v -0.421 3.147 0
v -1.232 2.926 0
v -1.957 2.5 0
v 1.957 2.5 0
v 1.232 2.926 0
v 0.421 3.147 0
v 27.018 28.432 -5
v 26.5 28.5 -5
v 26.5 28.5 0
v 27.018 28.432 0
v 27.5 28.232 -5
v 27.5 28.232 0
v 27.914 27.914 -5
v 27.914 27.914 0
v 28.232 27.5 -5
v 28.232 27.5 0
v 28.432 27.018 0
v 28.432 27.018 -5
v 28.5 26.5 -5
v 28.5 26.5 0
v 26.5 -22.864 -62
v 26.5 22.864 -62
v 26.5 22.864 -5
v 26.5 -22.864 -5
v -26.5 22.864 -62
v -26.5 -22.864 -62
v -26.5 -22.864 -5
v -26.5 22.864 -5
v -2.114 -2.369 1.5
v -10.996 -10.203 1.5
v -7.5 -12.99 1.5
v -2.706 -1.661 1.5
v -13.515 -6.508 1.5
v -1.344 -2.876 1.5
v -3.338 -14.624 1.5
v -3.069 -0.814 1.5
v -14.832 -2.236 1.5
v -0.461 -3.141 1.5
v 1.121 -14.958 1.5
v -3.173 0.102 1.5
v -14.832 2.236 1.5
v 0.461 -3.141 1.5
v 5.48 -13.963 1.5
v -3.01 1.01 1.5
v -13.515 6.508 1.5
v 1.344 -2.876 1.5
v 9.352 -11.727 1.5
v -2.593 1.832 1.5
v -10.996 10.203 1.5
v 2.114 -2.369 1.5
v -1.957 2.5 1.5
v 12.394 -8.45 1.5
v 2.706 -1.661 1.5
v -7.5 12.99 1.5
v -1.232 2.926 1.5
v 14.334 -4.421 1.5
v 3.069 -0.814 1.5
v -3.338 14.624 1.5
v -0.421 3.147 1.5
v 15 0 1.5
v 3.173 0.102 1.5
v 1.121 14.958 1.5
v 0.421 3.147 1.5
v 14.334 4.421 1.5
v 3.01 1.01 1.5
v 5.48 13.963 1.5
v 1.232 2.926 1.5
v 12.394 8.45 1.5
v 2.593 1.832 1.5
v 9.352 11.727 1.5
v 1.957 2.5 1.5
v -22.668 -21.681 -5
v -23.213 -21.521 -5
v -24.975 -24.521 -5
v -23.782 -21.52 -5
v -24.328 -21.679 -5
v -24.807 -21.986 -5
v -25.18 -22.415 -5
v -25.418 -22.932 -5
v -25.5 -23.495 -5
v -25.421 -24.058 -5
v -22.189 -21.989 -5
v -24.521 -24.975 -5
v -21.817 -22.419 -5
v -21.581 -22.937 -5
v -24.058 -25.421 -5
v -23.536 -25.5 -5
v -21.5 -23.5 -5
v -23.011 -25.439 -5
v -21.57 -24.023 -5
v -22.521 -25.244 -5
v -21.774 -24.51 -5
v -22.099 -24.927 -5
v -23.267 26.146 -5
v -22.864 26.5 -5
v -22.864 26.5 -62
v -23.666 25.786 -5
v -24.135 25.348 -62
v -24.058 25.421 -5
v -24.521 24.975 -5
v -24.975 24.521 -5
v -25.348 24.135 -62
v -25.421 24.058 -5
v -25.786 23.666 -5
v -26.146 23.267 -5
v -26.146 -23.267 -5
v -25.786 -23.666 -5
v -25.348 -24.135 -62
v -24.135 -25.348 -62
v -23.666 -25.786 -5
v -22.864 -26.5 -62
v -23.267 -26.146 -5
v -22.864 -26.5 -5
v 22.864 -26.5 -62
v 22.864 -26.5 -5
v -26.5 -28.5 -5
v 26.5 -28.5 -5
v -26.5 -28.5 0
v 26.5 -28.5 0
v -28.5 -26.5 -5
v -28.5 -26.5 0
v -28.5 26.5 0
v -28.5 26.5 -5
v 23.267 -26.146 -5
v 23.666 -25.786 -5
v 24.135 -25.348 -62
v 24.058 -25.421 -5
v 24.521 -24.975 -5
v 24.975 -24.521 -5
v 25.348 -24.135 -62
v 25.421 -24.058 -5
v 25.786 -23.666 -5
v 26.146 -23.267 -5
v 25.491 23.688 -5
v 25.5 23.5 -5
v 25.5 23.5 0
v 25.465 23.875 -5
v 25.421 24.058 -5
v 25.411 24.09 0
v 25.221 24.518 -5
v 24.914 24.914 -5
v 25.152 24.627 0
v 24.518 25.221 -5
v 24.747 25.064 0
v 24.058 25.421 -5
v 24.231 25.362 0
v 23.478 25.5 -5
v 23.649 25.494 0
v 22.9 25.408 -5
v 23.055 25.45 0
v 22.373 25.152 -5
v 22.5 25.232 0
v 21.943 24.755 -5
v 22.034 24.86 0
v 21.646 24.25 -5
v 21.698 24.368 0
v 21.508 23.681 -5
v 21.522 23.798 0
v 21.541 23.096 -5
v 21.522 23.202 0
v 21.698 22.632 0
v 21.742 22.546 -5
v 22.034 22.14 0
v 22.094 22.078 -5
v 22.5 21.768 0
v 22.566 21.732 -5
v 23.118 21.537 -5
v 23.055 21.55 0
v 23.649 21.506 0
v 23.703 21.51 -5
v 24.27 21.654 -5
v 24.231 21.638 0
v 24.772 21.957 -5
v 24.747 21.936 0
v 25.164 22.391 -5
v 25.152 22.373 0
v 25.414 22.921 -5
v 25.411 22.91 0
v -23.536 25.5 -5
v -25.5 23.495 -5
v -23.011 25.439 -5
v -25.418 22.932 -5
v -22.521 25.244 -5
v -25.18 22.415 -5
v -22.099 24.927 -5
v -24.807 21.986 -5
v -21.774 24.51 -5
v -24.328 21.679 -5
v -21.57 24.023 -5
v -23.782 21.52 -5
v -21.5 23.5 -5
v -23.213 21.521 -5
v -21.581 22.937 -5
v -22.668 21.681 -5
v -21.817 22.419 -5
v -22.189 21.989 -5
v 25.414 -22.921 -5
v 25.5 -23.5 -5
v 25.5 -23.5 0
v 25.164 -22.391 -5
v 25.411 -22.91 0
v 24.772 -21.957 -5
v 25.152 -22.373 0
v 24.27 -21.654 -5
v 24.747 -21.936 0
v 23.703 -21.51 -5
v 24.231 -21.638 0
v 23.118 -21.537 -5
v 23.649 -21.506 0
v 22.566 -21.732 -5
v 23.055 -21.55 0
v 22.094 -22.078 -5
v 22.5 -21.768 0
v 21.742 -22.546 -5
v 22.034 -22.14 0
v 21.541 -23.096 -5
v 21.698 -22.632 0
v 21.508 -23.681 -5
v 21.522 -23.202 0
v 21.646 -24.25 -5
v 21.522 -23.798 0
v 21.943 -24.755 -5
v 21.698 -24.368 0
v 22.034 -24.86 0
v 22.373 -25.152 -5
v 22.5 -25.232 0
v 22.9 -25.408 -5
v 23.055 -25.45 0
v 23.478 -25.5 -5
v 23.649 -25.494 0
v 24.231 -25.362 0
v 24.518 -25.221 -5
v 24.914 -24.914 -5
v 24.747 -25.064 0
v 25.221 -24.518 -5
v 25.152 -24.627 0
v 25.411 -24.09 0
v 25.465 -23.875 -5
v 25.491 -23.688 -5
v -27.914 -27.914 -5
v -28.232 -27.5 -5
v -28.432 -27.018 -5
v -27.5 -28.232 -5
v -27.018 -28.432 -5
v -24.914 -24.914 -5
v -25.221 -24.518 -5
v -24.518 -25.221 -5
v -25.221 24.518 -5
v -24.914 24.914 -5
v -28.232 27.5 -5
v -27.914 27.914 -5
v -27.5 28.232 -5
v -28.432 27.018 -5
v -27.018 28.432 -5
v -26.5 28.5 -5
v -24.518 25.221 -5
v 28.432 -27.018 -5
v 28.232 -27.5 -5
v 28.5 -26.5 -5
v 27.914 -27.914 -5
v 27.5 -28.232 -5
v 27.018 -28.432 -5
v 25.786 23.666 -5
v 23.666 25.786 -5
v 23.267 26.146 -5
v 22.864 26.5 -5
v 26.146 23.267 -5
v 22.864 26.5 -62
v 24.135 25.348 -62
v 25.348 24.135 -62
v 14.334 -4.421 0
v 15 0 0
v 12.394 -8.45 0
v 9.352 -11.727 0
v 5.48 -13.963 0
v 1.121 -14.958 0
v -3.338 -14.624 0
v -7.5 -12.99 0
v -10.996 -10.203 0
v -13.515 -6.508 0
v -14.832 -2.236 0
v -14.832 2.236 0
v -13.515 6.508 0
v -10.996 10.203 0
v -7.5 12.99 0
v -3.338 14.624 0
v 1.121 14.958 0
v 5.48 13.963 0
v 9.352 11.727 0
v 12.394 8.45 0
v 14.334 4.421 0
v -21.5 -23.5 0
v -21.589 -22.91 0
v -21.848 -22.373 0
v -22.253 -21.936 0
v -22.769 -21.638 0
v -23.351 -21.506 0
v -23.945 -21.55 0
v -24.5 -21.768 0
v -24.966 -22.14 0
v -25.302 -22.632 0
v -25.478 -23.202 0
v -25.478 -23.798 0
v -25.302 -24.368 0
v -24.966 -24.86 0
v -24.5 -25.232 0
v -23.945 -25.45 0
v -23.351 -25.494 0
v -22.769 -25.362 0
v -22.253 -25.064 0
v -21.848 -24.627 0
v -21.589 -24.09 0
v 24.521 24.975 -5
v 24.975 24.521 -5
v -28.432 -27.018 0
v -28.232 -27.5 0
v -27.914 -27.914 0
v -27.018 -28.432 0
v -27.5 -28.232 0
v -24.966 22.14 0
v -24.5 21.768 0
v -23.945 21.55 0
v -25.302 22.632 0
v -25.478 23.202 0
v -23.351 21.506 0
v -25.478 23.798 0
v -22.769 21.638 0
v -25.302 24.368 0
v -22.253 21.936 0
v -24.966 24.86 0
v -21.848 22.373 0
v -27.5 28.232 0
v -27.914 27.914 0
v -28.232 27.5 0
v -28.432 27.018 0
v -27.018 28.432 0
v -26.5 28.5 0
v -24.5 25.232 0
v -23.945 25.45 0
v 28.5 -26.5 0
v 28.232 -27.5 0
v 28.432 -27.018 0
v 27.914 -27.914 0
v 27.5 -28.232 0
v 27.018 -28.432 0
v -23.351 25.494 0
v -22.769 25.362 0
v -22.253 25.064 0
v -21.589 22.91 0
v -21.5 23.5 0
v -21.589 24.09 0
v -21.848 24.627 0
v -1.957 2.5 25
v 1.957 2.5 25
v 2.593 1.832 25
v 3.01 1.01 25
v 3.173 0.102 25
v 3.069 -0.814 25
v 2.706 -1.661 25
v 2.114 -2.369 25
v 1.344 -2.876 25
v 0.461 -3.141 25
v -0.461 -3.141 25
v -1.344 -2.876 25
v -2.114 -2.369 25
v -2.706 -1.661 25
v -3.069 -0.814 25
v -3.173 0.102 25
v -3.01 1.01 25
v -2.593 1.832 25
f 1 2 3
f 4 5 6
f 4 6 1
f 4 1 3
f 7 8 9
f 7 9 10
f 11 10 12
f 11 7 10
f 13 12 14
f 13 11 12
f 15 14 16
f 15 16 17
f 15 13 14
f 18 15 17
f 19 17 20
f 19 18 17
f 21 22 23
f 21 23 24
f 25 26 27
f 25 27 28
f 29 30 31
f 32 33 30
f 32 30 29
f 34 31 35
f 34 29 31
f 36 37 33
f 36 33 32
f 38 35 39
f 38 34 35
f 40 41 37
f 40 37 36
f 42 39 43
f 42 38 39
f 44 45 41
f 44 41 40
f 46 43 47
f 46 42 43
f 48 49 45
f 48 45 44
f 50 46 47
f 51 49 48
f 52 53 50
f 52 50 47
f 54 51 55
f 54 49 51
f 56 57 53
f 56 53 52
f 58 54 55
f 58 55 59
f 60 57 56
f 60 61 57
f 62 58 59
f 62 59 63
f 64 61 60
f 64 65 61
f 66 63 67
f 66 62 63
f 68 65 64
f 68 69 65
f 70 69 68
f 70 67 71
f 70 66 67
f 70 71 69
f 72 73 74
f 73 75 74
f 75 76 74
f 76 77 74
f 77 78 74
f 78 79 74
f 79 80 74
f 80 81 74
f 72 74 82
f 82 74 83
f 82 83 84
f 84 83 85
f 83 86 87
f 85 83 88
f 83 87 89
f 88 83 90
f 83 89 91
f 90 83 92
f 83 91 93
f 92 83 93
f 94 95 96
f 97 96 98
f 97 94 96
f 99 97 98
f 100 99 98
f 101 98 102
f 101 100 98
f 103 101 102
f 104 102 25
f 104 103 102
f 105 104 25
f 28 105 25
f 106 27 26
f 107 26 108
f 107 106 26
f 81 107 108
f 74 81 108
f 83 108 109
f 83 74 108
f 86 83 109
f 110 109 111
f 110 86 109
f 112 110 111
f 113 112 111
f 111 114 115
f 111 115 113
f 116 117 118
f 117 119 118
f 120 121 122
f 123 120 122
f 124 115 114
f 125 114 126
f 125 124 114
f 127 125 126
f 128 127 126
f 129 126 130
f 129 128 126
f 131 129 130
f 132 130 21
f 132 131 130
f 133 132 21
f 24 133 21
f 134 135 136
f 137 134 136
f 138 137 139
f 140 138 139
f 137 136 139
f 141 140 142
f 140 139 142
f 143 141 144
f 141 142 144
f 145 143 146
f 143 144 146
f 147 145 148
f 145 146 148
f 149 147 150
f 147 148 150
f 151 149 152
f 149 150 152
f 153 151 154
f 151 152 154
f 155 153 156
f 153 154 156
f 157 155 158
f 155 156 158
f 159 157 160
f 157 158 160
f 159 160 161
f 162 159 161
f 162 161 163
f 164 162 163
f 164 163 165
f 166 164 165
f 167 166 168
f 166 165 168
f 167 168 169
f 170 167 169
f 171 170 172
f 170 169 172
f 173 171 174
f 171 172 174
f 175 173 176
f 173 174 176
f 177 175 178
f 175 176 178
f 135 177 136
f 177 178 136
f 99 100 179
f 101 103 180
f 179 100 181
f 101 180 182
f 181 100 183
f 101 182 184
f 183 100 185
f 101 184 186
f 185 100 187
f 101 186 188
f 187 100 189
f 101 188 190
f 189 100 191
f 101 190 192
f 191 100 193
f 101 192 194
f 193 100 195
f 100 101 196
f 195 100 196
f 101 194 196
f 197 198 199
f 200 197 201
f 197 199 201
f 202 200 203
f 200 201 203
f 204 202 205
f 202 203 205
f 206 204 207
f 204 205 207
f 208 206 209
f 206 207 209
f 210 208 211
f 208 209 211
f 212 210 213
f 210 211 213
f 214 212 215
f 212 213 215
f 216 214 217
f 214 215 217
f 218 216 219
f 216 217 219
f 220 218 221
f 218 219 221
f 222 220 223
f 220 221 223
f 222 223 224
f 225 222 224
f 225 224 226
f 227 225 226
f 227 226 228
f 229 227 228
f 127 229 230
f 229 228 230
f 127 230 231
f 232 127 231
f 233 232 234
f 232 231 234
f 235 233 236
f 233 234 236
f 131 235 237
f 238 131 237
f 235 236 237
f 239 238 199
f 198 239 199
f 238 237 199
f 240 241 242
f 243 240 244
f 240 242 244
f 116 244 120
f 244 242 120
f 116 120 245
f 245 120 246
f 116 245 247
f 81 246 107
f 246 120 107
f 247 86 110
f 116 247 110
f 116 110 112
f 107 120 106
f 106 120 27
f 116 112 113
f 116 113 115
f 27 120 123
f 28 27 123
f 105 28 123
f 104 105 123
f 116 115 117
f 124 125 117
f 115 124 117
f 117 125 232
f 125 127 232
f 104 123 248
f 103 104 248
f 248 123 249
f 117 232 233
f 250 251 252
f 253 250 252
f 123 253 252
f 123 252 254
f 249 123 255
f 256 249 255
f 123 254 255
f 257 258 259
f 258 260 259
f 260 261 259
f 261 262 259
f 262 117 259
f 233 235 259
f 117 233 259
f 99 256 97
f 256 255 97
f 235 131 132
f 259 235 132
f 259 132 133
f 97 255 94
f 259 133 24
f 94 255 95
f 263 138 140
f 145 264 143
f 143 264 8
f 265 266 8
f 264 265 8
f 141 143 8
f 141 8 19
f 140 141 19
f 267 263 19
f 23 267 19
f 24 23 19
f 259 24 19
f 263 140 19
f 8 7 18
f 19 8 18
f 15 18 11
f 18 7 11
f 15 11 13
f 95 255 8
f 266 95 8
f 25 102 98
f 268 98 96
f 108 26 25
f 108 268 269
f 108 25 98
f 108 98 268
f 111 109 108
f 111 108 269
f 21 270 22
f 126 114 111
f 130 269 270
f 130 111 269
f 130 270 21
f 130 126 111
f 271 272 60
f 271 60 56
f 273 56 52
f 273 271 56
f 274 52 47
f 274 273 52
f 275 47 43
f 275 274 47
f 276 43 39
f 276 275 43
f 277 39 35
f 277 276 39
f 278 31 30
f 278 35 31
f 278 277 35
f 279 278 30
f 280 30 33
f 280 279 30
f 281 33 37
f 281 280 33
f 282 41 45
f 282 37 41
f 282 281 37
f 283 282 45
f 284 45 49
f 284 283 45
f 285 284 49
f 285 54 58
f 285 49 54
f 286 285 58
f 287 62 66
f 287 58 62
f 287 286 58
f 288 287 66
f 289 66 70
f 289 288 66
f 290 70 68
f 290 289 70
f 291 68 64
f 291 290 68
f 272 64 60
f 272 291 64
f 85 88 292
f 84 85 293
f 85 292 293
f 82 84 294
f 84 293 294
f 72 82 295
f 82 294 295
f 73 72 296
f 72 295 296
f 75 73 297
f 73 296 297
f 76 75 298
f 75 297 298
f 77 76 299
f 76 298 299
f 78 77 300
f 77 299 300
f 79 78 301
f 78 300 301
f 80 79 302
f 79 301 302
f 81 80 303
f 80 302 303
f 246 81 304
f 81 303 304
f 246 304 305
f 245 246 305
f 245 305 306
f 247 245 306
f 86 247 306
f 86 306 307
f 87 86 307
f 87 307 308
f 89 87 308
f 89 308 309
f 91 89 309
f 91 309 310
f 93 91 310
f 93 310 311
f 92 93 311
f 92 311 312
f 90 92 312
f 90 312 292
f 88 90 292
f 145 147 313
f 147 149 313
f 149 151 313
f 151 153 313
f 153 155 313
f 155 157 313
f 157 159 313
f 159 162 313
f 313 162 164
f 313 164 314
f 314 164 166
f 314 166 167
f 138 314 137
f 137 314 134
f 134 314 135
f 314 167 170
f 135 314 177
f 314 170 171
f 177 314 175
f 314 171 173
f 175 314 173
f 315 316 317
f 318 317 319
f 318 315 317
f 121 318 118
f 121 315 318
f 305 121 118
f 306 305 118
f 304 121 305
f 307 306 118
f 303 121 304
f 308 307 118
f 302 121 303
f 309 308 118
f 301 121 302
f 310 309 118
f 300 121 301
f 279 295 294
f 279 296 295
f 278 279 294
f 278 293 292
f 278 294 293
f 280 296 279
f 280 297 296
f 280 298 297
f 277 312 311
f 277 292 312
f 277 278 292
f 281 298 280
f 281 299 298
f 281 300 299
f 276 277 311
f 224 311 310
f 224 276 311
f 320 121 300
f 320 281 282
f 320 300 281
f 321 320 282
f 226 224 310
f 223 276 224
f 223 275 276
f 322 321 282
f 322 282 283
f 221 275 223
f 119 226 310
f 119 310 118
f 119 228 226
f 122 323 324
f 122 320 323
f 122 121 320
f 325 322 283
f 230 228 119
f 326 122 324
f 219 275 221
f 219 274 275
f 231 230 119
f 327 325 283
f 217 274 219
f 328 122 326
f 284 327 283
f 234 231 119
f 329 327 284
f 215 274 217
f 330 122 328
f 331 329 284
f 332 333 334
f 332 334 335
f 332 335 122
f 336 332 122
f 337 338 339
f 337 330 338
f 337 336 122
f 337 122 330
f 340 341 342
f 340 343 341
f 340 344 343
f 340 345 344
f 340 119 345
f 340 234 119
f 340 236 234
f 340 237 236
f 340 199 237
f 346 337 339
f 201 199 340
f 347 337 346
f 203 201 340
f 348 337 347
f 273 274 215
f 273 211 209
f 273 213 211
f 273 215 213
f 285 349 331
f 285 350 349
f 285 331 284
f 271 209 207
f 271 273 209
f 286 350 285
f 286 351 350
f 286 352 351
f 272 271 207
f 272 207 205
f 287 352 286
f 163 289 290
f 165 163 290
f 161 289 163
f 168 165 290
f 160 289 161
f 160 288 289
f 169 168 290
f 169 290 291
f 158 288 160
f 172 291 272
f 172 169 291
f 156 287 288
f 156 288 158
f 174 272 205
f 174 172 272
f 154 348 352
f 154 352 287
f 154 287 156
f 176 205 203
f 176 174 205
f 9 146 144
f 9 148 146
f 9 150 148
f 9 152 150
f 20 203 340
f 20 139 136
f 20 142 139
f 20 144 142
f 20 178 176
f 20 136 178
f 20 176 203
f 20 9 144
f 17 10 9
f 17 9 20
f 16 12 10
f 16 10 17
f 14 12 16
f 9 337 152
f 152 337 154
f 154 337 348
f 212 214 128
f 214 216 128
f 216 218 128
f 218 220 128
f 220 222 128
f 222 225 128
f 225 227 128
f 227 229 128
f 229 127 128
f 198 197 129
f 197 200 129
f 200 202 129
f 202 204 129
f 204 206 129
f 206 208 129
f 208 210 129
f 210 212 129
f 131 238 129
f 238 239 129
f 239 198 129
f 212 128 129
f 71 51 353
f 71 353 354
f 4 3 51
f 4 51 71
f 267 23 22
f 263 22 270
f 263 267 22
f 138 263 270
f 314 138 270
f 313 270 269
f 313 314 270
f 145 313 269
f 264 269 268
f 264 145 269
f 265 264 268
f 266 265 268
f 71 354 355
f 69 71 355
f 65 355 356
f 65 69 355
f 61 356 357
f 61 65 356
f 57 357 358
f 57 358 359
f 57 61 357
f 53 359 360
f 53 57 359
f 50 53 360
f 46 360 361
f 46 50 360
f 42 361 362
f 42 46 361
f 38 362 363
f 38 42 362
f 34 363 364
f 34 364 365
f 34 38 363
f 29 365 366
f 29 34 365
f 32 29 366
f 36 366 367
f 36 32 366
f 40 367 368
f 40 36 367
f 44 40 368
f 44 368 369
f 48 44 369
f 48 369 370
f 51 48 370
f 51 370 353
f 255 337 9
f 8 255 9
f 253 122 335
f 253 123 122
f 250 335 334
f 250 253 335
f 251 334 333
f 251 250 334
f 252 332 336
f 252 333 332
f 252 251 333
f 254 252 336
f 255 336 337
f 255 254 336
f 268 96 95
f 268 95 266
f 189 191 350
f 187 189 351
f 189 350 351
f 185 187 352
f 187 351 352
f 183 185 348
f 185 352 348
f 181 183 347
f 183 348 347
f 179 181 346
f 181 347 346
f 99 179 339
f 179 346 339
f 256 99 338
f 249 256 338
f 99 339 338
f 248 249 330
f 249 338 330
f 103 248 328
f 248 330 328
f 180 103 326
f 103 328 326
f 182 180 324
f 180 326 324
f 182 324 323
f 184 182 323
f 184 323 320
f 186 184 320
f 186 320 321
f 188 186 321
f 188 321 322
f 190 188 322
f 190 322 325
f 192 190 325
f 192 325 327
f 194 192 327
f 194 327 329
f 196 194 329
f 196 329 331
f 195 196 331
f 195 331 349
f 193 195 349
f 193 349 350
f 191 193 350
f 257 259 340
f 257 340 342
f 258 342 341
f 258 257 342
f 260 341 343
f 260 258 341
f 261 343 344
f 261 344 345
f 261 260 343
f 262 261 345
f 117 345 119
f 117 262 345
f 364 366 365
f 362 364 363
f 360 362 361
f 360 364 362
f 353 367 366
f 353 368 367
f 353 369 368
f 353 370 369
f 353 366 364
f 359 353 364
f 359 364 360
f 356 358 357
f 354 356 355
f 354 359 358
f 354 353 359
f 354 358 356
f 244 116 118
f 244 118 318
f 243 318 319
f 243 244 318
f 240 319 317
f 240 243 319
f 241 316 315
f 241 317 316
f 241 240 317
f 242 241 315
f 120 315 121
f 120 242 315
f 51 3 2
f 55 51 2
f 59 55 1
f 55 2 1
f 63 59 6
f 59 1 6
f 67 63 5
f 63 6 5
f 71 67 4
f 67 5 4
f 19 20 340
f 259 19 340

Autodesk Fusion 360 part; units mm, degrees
sketch "Sketch1" plane through (0, 0, 0) normal (0, 0, 1) x (1, 0, 0)
  circle A0 centre (0, 0) radius 3.175
  line L0 (-1.9572, 2.5) -> (1.9572, 2.5)
  line L1 (-23.5, 23.5) -> (23.5, 23.5) construction
  line L2 (23.5, 23.5) -> (23.5, -23.5) construction
  line L3 (23.5, -23.5) -> (-23.5, -23.5) construction
  line L4 (-23.5, -23.5) -> (-23.5, 23.5) construction
  line L5 (-28.5, 28.5) -> (28.5, 28.5)
  line L6 (28.5, 28.5) -> (28.5, -28.5)
  line L7 (28.5, -28.5) -> (-28.5, -28.5)
  line L8 (-28.5, -28.5) -> (-28.5, 28.5)
  line L9 (-23.5, 23.5) -> (23.5, -23.5) construction
  line L10 (28.5, 28.5) -> (-28.5, -28.5) construction
  circle A1 centre (-23.5, 23.5) radius 2
  circle A2 centre (-23.5, -23.5) radius 2
  circle A3 centre (23.5, -23.5) radius 2
  circle A4 centre (23.5, 23.5) radius 2
  circle A5 centre (0, 0) radius 15
  dimension "d1" = 6.35
  dimension "d2" = 2.5
  dimension "d3" = 47
  dimension "d5" = 57
  dimension "d6" = 4
  dimension "d8" = 360
  dimension "d9" = 30
extrude "Extrude1" add sketch "Sketch1" against normal blind 5 contours A0 L0 | A0 L0 | L5 L6 L7 L8 | A5
sketch "Sketch2" plane through (0, 0, -5) normal (0, 0, -1) x (1, 0, 0)
  circle A0 centre (-23.5, -23.5) radius 2
  circle A1 centre (-23.5, 23.5) radius 2
  circle A2 centre (23.5, 23.5) radius 2
  circle A3 centre (23.5, -23.5) radius 2
  line L0 (28.5, 28.5) -> (-28.5, 28.5)
  line L1 (-28.5, 28.5) -> (-28.5, -28.5)
  line L2 (-28.5, -28.5) -> (28.5, -28.5)
  line L3 (28.5, -28.5) -> (28.5, 28.5)
  line L4 (-28.5, -28.5) -> (28.5, 28.5) construction
  circle A4 centre (0, 0) radius 35
  line L5 (26.5, -26.5) -> (26.5, 26.5)
  line L6 (26.5, 26.5) -> (-26.5, 26.5)
  line L7 (-26.5, 26.5) -> (-26.5, -26.5)
  line L8 (-26.5, -26.5) -> (26.5, -26.5)
  dimension "d12" = 70
  dimension "d13" = -2
extrude "Extrude2" add sketch "Sketch2" along normal blind 57 contours A0 A4 | A0 A1 A2 A3 A4 L5 L6 L7 L8 | A1 A4 | A3 A4 | A2 A4 picked at (-23.8415, -23.8801) picked at (-23.8415, 23.8801) picked at (23.863, -23.8578) picked at (23.863, 23.8578)
extrude "Extrude3" add sketch "Sketch1" along normal blind 25 contours A0 L0 picked at (0.6292, 0.6577)
extrude "Extrude4" add sketch "Sketch1" along normal blind 1.5 contours A5
fillet "Fillet1" radius 2 4 edges at (-28.5, 28.5, -2.5) (28.5, 28.5, -2.5) (28.5, -28.5, -2.5) (-28.5, -28.5, -2.5)
